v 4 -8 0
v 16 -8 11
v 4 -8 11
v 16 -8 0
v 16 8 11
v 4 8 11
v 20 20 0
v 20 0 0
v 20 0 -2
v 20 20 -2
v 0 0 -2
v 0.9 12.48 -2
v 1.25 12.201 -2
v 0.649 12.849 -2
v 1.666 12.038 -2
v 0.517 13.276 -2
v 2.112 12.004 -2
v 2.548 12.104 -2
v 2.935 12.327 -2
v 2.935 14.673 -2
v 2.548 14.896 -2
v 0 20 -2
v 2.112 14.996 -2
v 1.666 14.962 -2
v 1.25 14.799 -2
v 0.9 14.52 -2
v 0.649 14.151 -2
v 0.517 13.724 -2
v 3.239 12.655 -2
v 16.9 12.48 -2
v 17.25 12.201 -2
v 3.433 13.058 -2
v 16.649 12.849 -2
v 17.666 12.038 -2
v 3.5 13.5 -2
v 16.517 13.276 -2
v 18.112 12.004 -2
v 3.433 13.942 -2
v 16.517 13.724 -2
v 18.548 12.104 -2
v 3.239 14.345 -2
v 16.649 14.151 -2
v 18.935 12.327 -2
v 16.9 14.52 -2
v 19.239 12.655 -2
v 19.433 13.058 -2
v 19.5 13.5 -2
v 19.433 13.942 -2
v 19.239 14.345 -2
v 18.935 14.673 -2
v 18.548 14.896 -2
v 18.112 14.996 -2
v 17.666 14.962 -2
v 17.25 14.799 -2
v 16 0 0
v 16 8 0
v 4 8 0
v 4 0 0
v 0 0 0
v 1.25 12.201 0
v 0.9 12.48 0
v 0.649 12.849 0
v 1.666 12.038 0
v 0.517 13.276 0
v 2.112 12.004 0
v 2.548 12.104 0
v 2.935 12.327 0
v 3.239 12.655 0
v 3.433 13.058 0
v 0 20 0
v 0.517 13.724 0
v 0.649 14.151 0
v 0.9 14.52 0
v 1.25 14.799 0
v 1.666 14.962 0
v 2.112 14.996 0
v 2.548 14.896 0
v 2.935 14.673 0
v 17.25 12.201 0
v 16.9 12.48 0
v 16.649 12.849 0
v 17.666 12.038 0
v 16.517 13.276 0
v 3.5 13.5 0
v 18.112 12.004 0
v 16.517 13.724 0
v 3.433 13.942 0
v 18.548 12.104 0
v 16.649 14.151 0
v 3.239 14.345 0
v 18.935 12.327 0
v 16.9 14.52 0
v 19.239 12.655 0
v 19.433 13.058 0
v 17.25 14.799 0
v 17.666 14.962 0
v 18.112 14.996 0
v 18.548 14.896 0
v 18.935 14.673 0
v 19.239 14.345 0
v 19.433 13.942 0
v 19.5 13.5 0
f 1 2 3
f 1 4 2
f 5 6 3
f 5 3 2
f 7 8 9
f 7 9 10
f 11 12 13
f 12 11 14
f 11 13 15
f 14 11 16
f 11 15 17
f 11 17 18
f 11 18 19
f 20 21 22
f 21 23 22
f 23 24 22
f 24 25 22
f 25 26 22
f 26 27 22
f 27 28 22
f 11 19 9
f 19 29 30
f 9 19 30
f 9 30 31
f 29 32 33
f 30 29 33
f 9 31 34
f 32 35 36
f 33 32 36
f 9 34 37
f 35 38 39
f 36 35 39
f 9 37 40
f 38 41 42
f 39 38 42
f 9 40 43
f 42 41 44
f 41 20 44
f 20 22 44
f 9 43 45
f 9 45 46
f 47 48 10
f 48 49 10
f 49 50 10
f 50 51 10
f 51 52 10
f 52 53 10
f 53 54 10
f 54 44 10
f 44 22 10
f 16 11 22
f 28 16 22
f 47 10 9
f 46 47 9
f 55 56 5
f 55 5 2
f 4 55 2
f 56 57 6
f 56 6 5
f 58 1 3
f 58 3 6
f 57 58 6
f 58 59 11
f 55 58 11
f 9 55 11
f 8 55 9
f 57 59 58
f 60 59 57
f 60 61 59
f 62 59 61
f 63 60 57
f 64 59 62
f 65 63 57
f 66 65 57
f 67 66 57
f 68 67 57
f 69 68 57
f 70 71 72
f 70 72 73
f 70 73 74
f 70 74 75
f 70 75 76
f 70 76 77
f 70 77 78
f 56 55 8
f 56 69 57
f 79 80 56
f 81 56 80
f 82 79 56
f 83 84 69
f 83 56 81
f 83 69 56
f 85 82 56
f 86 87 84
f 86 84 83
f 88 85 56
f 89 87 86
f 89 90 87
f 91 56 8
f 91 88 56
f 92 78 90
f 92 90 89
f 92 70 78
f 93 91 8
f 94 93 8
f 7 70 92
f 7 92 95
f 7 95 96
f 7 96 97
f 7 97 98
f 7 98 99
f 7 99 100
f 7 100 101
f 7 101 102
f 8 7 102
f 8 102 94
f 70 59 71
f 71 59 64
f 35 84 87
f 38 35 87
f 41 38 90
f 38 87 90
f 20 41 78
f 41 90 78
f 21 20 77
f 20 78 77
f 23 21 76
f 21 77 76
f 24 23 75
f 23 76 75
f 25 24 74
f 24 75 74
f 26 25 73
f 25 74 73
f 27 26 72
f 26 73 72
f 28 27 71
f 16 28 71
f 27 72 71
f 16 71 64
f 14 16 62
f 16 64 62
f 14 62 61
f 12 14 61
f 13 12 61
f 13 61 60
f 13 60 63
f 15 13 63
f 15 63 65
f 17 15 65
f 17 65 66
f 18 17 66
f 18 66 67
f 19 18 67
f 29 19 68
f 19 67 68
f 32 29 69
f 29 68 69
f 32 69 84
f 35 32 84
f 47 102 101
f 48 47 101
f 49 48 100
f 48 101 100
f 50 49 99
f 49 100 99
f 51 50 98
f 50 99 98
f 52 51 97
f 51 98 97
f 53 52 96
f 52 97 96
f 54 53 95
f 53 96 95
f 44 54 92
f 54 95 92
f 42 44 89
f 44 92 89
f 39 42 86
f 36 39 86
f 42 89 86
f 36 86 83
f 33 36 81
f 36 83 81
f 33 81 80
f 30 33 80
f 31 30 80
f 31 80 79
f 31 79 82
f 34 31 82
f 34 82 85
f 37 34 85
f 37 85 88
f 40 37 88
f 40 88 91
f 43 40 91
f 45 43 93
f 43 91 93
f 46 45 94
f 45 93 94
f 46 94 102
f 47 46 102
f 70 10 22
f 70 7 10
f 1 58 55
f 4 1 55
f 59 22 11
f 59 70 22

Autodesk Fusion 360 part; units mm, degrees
sketch "Sketch1" plane through (0, 0, 0) normal (0, 0, 1) x (1, 0, 0)
  line L0 (0, 0) -> (20, 0)
  line L1 (20, 0) -> (20, 20)
  line L2 (20, 20) -> (0, 20)
  line L3 (0, 20) -> (0, 0)
  line L4 (4, 8) -> (16, 8)
  line L5 (16, 8) -> (16, -8)
  line L6 (16, -8) -> (4, -8)
  line L7 (4, -8) -> (4, 8)
  line L8 (4, 8) -> (16, -8) construction
  line L9 (16, 8) -> (4, -8) construction
  line L10 (20, 20) -> (0, 20)
  line L11 (0, 20) -> (0, 13.5)
  line L12 (0, 13.5) -> (20, 13.5)
  line L13 (20, 13.5) -> (20, 20)
  line L14 (0, 20) -> (2, 20)
  line L15 (2, 20) -> (2, 13.5)
  line L16 (2, 13.5) -> (0, 13.5)
  line L17 (0, 13.5) -> (0, 20)
  line L18 (20, 20) -> (18, 20)
  line L19 (18, 20) -> (18, 13.5)
  line L20 (18, 13.5) -> (20, 13.5)
  line L21 (20, 13.5) -> (20, 20)
  circle A0 centre (2, 13.5) radius 1.5
  circle A1 centre (18, 13.5) radius 1.5
  point P0 (10, 0)
  dimension "d1" = 20
  dimension "d2" = 20
  dimension "d3" = 16
  dimension "d4" = 20
  dimension "d5" = 6.5
  dimension "d6" = 2
  dimension "d7" = 2
extrude "Extrude1" add sketch "Sketch1" against normal blind 2 contours L0 L1 L3 L4 L5 L7 L12 L16 L20 A0 A1 | L0 L4 L5 L7 | L2 L3 L10 L11 L12 L14 L15 L16 L17 A0 | L2 L10 L12 L15 L19 A0 A1 | L1 L2 L10 L12 L13 L18 L19 L20 L21 A1
extrude "Extrude2" add sketch "Sketch1" along normal blind 11 contours L0 L4 L5 L7 | L0 L5 L6 L7
